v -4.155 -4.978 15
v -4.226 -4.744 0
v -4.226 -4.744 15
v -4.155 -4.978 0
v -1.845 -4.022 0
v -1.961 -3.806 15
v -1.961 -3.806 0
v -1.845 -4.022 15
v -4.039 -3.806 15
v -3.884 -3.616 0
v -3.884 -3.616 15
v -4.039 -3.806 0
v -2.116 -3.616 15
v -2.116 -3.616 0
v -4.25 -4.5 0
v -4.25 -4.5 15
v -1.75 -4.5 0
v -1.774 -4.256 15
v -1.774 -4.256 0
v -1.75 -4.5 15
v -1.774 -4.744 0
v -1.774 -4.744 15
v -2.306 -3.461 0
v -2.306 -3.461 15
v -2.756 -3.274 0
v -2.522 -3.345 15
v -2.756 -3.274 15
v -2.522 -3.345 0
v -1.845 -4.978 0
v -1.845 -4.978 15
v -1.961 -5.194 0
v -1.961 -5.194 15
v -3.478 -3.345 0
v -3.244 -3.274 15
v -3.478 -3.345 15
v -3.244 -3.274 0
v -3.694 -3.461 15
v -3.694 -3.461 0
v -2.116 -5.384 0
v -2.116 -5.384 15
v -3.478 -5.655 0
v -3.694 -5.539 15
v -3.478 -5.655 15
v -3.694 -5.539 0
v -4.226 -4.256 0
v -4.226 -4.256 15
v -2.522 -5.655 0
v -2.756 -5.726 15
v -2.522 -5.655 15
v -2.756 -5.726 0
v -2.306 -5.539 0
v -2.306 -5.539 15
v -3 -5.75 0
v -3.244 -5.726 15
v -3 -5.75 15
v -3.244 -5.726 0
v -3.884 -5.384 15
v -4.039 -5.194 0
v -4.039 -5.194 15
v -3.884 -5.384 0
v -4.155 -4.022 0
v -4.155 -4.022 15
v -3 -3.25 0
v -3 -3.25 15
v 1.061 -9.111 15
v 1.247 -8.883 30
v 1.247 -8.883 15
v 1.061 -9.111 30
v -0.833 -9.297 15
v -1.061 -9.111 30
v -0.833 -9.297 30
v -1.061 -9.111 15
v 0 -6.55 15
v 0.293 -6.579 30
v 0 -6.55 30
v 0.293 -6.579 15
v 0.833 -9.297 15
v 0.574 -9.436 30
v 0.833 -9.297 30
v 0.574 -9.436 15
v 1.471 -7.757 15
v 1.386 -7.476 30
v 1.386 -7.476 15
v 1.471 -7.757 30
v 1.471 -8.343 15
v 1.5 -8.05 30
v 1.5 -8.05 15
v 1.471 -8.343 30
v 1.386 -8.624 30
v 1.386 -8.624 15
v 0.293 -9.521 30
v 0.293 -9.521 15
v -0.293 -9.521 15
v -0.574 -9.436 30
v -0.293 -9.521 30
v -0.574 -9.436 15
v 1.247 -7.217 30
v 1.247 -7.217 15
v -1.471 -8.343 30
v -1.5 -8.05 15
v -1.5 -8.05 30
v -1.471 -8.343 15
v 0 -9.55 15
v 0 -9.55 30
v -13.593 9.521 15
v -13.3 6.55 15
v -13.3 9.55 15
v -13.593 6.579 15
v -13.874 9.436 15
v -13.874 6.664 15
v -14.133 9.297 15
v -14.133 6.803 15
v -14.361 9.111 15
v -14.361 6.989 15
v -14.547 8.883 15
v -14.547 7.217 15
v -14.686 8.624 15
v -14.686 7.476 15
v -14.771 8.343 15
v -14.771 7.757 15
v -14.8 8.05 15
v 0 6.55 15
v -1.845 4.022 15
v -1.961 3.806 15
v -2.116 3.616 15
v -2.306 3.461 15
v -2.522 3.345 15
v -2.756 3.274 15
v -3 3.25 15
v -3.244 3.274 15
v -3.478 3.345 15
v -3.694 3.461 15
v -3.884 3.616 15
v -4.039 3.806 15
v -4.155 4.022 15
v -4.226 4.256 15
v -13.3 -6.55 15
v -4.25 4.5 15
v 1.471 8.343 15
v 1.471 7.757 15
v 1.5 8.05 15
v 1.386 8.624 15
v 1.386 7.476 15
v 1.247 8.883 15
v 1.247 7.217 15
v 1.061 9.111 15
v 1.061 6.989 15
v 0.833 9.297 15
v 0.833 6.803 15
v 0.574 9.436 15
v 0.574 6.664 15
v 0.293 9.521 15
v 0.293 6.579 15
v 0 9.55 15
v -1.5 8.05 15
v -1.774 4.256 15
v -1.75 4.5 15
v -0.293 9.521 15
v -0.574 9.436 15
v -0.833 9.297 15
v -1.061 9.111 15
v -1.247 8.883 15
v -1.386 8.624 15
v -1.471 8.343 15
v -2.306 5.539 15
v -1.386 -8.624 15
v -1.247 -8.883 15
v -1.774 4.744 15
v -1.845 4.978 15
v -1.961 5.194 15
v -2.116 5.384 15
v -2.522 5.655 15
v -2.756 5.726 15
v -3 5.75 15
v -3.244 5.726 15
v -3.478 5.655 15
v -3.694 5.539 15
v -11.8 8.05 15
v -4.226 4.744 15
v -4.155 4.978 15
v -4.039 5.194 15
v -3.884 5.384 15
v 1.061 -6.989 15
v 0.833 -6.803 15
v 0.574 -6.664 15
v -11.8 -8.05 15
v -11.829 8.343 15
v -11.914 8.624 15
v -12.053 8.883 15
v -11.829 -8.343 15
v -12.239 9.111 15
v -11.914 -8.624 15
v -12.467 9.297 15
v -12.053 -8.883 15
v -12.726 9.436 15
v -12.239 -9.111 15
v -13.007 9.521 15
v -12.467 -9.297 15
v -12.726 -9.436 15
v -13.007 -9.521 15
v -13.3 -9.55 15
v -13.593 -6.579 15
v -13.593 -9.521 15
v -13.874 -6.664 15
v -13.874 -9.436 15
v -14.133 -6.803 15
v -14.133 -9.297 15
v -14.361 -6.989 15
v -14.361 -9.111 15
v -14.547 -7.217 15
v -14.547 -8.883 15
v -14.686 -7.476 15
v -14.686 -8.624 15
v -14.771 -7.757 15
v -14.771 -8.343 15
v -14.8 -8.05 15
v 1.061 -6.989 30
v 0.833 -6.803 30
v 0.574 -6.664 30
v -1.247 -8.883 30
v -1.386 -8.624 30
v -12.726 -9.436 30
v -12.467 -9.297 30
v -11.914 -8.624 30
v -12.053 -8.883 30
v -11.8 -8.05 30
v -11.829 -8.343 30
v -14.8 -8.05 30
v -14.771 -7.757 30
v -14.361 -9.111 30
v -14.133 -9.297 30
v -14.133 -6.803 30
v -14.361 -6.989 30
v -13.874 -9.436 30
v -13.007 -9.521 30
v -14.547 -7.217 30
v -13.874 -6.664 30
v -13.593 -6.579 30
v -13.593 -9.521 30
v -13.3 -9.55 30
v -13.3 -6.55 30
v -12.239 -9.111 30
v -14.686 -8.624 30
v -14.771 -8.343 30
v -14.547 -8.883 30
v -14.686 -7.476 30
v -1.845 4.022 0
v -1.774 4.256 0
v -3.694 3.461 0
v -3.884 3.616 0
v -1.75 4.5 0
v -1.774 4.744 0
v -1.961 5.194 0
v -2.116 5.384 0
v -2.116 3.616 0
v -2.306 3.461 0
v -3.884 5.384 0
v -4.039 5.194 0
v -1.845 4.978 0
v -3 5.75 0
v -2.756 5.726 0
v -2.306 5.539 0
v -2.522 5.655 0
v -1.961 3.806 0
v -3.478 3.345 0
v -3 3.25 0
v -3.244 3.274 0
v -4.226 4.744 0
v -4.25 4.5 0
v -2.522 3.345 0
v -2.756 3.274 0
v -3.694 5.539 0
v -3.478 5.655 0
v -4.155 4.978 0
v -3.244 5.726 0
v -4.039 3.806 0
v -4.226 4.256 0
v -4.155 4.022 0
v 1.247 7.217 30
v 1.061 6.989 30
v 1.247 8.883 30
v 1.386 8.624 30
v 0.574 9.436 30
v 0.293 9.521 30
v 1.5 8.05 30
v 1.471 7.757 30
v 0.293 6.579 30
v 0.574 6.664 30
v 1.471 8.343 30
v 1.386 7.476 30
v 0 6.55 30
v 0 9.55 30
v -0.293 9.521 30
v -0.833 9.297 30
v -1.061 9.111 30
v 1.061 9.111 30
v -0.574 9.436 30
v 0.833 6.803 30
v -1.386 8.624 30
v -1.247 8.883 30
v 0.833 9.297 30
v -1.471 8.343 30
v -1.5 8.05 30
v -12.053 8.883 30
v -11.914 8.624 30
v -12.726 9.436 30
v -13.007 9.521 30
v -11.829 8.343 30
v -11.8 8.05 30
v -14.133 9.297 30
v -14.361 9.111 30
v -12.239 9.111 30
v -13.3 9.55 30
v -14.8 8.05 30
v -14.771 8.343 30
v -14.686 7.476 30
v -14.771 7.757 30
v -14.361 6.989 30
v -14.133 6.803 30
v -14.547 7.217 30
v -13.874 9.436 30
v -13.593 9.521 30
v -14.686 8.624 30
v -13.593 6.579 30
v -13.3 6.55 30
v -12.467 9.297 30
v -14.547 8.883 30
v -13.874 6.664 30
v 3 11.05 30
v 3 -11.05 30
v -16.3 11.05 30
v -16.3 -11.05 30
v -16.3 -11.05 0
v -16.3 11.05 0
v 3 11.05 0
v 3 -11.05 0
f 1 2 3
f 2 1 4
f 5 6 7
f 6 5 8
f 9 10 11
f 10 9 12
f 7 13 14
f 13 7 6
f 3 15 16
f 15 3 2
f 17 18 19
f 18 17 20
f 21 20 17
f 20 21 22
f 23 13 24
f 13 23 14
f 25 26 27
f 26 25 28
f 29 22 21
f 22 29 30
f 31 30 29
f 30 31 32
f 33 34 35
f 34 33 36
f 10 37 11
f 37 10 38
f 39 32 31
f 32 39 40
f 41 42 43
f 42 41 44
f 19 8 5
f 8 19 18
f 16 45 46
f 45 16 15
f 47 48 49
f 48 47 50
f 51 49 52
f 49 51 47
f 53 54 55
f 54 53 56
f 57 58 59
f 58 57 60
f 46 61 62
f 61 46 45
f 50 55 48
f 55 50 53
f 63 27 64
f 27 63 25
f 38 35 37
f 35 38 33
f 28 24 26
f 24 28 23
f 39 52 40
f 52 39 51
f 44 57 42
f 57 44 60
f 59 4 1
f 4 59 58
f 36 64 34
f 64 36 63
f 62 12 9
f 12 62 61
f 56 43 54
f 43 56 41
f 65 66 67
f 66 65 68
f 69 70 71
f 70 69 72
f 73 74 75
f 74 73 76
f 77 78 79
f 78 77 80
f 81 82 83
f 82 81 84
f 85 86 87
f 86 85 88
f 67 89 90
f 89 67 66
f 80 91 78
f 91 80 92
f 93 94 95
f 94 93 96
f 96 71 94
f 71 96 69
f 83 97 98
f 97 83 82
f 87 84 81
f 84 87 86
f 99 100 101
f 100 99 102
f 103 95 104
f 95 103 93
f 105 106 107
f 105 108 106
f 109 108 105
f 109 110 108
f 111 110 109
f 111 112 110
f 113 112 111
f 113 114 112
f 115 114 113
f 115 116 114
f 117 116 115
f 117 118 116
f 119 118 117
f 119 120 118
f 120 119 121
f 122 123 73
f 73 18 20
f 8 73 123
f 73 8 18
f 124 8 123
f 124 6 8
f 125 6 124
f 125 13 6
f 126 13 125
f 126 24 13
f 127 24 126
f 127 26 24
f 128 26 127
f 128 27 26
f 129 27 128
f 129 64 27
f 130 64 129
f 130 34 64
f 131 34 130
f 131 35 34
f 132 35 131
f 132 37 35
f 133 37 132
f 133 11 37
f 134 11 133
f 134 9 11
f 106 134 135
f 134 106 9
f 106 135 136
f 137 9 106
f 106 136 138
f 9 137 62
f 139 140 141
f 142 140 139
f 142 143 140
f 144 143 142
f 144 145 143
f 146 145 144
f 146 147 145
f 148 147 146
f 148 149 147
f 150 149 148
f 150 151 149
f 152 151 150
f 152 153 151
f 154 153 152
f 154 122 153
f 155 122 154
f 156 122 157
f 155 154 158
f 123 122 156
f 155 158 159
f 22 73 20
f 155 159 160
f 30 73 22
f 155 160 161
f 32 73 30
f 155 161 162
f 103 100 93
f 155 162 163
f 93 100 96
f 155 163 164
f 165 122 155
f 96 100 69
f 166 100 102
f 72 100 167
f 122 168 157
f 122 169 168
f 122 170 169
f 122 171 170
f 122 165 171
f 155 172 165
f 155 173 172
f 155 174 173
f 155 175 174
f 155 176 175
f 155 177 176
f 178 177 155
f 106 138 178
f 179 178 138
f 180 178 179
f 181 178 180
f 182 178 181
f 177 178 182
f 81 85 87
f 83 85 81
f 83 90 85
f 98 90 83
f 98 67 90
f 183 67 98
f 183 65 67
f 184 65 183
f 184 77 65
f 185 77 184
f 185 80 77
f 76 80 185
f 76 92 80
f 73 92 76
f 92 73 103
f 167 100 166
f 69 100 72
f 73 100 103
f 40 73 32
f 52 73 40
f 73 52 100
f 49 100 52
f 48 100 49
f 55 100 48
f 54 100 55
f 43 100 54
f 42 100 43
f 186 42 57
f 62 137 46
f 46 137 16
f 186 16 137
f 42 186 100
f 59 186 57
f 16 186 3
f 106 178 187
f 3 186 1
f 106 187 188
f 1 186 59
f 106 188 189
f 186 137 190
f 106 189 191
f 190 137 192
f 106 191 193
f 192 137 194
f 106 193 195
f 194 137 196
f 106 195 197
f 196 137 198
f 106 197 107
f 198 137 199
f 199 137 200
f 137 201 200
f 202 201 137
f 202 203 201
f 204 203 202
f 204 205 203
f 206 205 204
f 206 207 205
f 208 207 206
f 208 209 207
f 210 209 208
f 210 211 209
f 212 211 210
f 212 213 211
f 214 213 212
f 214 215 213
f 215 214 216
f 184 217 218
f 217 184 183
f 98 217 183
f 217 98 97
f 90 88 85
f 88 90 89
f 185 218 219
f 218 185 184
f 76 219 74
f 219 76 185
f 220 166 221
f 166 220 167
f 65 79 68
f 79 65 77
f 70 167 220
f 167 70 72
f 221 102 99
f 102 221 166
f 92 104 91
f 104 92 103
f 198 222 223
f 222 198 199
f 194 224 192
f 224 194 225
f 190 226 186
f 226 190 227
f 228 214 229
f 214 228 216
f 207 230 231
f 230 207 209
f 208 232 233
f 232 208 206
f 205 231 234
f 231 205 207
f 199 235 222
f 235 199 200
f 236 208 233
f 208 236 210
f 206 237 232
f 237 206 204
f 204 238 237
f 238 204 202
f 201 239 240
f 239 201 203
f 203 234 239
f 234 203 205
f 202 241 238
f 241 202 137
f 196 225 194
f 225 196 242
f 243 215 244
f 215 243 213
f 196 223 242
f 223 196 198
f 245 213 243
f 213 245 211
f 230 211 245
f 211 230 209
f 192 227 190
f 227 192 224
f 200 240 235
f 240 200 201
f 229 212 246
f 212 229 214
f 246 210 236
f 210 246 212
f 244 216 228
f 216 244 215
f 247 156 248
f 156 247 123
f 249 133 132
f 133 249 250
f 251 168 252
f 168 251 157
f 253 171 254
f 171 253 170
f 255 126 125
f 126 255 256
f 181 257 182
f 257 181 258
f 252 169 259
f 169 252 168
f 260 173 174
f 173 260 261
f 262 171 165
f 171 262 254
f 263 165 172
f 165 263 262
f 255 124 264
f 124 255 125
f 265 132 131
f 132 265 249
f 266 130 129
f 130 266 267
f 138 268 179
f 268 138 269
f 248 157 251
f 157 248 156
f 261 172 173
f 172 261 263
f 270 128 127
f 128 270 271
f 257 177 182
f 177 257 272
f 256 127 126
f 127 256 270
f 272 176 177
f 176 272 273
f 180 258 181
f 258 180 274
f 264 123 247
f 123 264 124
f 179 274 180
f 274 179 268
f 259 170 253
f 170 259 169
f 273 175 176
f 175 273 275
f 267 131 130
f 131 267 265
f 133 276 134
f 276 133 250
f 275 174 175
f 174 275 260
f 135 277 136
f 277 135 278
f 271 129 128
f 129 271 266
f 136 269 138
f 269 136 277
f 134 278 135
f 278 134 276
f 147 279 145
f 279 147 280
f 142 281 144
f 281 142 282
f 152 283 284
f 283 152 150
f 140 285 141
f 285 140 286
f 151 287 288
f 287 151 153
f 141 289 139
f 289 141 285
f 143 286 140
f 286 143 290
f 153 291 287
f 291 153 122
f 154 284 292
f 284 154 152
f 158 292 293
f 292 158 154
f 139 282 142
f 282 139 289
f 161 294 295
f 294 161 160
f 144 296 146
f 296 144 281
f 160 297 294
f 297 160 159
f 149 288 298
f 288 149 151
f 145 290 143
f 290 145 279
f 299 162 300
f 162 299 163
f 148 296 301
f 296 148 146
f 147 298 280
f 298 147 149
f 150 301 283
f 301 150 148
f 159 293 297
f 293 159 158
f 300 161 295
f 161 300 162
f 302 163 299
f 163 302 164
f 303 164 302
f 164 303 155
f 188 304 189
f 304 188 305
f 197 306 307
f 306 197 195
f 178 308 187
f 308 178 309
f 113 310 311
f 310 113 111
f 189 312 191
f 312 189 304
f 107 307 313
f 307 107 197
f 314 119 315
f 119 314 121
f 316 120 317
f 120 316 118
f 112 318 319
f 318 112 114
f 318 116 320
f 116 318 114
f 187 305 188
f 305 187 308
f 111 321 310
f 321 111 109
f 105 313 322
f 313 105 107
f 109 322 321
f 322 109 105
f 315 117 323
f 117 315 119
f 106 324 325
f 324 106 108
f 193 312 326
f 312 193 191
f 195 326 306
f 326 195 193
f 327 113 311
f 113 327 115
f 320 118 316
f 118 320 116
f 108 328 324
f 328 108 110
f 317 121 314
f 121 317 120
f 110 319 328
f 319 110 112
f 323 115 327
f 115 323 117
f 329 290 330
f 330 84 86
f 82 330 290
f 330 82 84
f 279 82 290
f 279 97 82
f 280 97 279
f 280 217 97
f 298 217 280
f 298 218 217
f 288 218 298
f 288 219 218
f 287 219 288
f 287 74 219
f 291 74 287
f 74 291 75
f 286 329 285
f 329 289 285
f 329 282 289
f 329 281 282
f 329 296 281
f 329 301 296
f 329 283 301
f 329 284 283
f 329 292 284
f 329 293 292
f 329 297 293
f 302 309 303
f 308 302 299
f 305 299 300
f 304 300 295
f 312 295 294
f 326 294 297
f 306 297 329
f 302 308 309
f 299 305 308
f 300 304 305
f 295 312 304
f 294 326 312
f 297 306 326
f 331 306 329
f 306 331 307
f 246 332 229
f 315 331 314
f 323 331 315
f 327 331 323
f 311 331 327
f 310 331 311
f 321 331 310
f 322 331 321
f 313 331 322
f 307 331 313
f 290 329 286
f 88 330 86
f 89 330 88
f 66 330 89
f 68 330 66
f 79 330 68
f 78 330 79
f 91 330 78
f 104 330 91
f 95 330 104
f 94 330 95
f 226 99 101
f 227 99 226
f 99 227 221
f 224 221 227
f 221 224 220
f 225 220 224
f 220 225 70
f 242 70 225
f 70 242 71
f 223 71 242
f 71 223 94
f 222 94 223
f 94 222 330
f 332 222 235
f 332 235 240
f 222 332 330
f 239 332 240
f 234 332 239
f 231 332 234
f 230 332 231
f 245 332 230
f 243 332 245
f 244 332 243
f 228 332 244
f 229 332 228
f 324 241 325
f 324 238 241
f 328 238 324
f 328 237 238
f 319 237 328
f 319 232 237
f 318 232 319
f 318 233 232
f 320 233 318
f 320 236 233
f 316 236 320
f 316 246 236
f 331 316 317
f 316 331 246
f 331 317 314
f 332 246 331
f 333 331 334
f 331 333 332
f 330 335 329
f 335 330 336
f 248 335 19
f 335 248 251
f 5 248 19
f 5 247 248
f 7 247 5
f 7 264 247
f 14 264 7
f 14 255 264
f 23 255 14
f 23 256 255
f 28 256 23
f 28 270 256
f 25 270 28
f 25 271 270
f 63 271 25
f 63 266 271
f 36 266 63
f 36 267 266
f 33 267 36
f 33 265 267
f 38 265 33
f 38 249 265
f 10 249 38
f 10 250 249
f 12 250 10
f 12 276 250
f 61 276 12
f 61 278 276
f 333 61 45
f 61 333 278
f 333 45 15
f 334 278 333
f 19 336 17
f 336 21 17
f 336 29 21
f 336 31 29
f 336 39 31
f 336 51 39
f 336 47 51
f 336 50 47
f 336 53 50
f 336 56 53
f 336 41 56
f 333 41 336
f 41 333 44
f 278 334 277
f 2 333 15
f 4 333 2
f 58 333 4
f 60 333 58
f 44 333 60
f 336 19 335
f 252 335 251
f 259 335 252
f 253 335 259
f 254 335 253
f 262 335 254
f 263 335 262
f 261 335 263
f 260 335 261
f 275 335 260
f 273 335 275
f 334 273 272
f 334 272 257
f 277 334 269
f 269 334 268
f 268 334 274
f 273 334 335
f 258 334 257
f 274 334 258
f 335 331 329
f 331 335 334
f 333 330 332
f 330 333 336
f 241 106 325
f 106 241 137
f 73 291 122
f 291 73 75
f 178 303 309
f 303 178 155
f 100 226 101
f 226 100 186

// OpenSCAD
$fn=32;

bar_w = 16+0.1;
bar_h = 13+0.3;

wall=3;

//l1 = 10;
//l2 = 15;

l1 = 15;
l2 = 15;

l = l1+l2;

eps=0.1;

hole_space=9;
hole_height=3;
//h//ole_depth=10;

release_d = 3;

d=2.5;

module main() {
  difference() {
    translate([0, -bar_w/2-wall, -wall]) 
      cube([l, bar_w+2*wall, bar_h+2*wall]);
    
    translate([l2, -bar_w/2, ]) cube([l1+eps, bar_w, bar_h]);


    for (i = [-1:2:1]) {
     translate([-eps, i*hole_space/2, hole_height]) rotate([0, 90, 0]) cylinder(d=d, h=l2 + 2*eps);
    
    
    translate([l2, i*bar_w/2, 0]) rotate([0, 90, 0]) cylinder(d=release_d, h=l1+eps);
      
        translate([l2, i*bar_w/2, bar_h]) rotate([0, 90, 0]) cylinder(d=release_d, h=l1+eps);
    }
  }
}

rotate([0, -90, 0]) 
main();
